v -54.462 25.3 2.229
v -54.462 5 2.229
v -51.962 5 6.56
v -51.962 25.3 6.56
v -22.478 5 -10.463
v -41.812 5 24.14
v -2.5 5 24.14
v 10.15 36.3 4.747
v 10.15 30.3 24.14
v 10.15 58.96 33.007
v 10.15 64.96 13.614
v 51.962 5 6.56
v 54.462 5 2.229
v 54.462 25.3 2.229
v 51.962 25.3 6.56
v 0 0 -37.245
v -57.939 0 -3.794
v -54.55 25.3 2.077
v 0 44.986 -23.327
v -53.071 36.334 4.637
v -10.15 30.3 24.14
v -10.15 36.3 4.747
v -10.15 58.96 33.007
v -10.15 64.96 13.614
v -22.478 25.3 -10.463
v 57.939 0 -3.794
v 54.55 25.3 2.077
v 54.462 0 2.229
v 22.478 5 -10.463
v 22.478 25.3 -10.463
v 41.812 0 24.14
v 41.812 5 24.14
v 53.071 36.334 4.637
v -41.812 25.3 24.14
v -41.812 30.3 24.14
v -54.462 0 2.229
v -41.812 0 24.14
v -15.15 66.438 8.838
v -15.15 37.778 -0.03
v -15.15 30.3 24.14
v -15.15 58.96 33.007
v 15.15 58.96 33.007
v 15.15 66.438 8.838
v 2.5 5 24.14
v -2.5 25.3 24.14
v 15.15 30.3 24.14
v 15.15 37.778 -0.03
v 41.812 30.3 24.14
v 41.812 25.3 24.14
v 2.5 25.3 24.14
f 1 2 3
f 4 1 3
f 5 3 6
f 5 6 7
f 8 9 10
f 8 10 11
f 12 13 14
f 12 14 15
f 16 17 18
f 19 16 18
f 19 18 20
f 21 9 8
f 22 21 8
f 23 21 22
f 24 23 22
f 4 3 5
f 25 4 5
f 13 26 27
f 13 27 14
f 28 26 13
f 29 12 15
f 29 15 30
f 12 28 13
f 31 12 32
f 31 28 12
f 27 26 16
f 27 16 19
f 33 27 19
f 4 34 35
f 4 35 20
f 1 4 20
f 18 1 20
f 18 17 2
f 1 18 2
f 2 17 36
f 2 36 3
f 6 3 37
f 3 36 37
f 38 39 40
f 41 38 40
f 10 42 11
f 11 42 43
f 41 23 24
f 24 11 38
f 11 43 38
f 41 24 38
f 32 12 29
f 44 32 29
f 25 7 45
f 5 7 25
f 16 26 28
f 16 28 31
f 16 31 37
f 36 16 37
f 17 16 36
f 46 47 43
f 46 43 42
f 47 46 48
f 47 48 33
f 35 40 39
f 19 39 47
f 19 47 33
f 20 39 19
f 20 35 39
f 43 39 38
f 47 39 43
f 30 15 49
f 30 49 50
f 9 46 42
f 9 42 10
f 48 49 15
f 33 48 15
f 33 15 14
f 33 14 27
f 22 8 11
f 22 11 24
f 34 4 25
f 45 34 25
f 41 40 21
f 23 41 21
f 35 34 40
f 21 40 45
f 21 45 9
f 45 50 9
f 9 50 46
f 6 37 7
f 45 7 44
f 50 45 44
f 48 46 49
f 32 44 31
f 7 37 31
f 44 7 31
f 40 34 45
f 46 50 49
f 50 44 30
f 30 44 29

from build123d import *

# Parameters (mm, degrees)
BOSS_EXTRUDE2_DEPTH = 5
BOSS_EXTRUDE3_DEPTH = 20.3
BOSS_EXTRUDE4_DEPTH = 5
BOSS_EXTRUDE5_DEPTH = 50
CUT_EXTRUDE5_DEPTH  = 120.550160374
CUT_EXTRUDE6_DEPTH  = 106.793534237
BOSS_EXTRUDE6_DEPTH = 30
BOSS_EXTRUDE7_DEPTH = 20.3


with BuildPart() as part:
    # Sketch3 → Boss-Extrude2 (new body)
    with BuildSketch(Plane(origin=(0, 0, 0), x_dir=(1, 0, 0), z_dir=(0, 1, 0))):
        Polygon((-54.461524227, -2.229452052), (-41.811524227, -24.139894768), (0, -24.139894768), (0, 29.213923621), (0, 53.936652846), (-65.166780007, 16.312594867), align=None)
    boss_extrude2 = extrude(amount=BOSS_EXTRUDE2_DEPTH)

    # Sketch4 → Boss-Extrude3 (add)
    with BuildSketch(Plane(origin=(0, 5, 0), x_dir=(1, 0, 0), z_dir=(0, 1, 0))):
        Polygon((-51.961524227, -6.559579071), (0, 23.440420929), (0, 29.213923621), (0, 53.936652846), (-65.166780007, 16.312594867), (-54.461524227, -2.229452052), align=None)
    boss_extrude3 = extrude(amount=BOSS_EXTRUDE3_DEPTH)

    # Sketch5 → Boss-Extrude4 (add)
    with BuildSketch(Plane(origin=(0, 25.3, 0), x_dir=(1, 0, 0), z_dir=(0, 1, 0))):
        Polygon((-65.166780007, 16.312594867), (-41.811524227, -24.139894768), (0, -24.139894768), (0, 53.936652846), align=None)
    boss_extrude4 = extrude(amount=BOSS_EXTRUDE4_DEPTH)

    # Sketch7 → Boss-Extrude5 (add)
    with BuildSketch(Plane(origin=(0, 30.3, 0), x_dir=(1, 0, 0), z_dir=(0, 1, 0))):
        Polygon((-65.166780007, 16.312594867), (0, 53.936652846), (0, -24.139894768), (-41.811524227, -24.139894768), align=None)
    boss_extrude5 = extrude(amount=BOSS_EXTRUDE5_DEPTH)

    # Sketch12 → Cut-Extrude5 (cut, through all)
    with BuildSketch(Plane(origin=(-41.811524227, 0, 24.139894768), x_dir=(0.5000000000000006, 0, 0.8660254037844384), z_dir=(-0.8660254037844384, 0, 0.5000000000000006))):
        Polygon((-46.71051156, 80.3), (-46.71051156, 0), (-32.255495471, 0), (-10.739175318, 80.3), align=None)
    cut_extrude5 = extrude(amount=-CUT_EXTRUDE5_DEPTH, mode=Mode.SUBTRACT)

    # Sketch16 → Cut-Extrude6 (cut, through all)
    with BuildSketch(Plane(origin=(0, 0, 0), x_dir=(0, 0, -1), z_dir=(1, 0, 0))):
        Polygon((-24.139894768, 30.3), (23.326658439, 44.986202672), (12.400531522, 80.3), (-24.139894768, 80.3), align=None)
    cut_extrude6 = extrude(amount=-CUT_EXTRUDE6_DEPTH, mode=Mode.SUBTRACT)

    # Sketch17 → Boss-Extrude6 (add)
    with BuildSketch(Plane(origin=(0, 34.469205914, 10.664809425), x_dir=(1, 0, 0), z_dir=(0, 0.9553190031279326, 0.2955767282156244))):
        Polygon((-10.15, -14.10532534), (-10.15, 6.19467466), (0, 6.19467466), (0, 11.19467466), (-15.15, 11.19467466), (-15.15, -14.10532534), align=None)
    boss_extrude6 = extrude(amount=BOSS_EXTRUDE6_DEPTH)

    # Sketch18 → Boss-Extrude7 (add)
    with BuildSketch(Plane(origin=(0, 5, 0), x_dir=(1, 0, 0), z_dir=(0, 1, 0))):
        Polygon((0, -24.139894768), (-2.5, -24.139894768), (-22.477881057, 10.46281025), (0, 23.440420929), align=None)
    boss_extrude7 = extrude(amount=BOSS_EXTRUDE7_DEPTH)

    # Mirror2: Boss-Extrude2, Boss-Extrude3, Boss-Extrude4, Boss-Extrude5, Cut-Extrude5, Cut-Extrude6, Boss-Extrude6, Boss-Extrude7 across plane
    add(boss_extrude2.mirror(Plane(origin=(0, 5, -53.936652846), x_dir=(0, 0, 1), z_dir=(-1, 0, 0))))
    add(boss_extrude3.mirror(Plane(origin=(0, 5, -53.936652846), x_dir=(0, 0, 1), z_dir=(-1, 0, 0))))
    add(boss_extrude4.mirror(Plane(origin=(0, 5, -53.936652846), x_dir=(0, 0, 1), z_dir=(-1, 0, 0))))
    add(boss_extrude5.mirror(Plane(origin=(0, 5, -53.936652846), x_dir=(0, 0, 1), z_dir=(-1, 0, 0))))
    add(cut_extrude5.mirror(Plane(origin=(0, 5, -53.936652846), x_dir=(0, 0, 1), z_dir=(-1, 0, 0))), mode=Mode.SUBTRACT)
    add(cut_extrude6.mirror(Plane(origin=(0, 5, -53.936652846), x_dir=(0, 0, 1), z_dir=(-1, 0, 0))), mode=Mode.SUBTRACT)
    add(boss_extrude6.mirror(Plane(origin=(0, 5, -53.936652846), x_dir=(0, 0, 1), z_dir=(-1, 0, 0))))
    add(boss_extrude7.mirror(Plane(origin=(0, 5, -53.936652846), x_dir=(0, 0, 1), z_dir=(-1, 0, 0))))


solid = part.part
